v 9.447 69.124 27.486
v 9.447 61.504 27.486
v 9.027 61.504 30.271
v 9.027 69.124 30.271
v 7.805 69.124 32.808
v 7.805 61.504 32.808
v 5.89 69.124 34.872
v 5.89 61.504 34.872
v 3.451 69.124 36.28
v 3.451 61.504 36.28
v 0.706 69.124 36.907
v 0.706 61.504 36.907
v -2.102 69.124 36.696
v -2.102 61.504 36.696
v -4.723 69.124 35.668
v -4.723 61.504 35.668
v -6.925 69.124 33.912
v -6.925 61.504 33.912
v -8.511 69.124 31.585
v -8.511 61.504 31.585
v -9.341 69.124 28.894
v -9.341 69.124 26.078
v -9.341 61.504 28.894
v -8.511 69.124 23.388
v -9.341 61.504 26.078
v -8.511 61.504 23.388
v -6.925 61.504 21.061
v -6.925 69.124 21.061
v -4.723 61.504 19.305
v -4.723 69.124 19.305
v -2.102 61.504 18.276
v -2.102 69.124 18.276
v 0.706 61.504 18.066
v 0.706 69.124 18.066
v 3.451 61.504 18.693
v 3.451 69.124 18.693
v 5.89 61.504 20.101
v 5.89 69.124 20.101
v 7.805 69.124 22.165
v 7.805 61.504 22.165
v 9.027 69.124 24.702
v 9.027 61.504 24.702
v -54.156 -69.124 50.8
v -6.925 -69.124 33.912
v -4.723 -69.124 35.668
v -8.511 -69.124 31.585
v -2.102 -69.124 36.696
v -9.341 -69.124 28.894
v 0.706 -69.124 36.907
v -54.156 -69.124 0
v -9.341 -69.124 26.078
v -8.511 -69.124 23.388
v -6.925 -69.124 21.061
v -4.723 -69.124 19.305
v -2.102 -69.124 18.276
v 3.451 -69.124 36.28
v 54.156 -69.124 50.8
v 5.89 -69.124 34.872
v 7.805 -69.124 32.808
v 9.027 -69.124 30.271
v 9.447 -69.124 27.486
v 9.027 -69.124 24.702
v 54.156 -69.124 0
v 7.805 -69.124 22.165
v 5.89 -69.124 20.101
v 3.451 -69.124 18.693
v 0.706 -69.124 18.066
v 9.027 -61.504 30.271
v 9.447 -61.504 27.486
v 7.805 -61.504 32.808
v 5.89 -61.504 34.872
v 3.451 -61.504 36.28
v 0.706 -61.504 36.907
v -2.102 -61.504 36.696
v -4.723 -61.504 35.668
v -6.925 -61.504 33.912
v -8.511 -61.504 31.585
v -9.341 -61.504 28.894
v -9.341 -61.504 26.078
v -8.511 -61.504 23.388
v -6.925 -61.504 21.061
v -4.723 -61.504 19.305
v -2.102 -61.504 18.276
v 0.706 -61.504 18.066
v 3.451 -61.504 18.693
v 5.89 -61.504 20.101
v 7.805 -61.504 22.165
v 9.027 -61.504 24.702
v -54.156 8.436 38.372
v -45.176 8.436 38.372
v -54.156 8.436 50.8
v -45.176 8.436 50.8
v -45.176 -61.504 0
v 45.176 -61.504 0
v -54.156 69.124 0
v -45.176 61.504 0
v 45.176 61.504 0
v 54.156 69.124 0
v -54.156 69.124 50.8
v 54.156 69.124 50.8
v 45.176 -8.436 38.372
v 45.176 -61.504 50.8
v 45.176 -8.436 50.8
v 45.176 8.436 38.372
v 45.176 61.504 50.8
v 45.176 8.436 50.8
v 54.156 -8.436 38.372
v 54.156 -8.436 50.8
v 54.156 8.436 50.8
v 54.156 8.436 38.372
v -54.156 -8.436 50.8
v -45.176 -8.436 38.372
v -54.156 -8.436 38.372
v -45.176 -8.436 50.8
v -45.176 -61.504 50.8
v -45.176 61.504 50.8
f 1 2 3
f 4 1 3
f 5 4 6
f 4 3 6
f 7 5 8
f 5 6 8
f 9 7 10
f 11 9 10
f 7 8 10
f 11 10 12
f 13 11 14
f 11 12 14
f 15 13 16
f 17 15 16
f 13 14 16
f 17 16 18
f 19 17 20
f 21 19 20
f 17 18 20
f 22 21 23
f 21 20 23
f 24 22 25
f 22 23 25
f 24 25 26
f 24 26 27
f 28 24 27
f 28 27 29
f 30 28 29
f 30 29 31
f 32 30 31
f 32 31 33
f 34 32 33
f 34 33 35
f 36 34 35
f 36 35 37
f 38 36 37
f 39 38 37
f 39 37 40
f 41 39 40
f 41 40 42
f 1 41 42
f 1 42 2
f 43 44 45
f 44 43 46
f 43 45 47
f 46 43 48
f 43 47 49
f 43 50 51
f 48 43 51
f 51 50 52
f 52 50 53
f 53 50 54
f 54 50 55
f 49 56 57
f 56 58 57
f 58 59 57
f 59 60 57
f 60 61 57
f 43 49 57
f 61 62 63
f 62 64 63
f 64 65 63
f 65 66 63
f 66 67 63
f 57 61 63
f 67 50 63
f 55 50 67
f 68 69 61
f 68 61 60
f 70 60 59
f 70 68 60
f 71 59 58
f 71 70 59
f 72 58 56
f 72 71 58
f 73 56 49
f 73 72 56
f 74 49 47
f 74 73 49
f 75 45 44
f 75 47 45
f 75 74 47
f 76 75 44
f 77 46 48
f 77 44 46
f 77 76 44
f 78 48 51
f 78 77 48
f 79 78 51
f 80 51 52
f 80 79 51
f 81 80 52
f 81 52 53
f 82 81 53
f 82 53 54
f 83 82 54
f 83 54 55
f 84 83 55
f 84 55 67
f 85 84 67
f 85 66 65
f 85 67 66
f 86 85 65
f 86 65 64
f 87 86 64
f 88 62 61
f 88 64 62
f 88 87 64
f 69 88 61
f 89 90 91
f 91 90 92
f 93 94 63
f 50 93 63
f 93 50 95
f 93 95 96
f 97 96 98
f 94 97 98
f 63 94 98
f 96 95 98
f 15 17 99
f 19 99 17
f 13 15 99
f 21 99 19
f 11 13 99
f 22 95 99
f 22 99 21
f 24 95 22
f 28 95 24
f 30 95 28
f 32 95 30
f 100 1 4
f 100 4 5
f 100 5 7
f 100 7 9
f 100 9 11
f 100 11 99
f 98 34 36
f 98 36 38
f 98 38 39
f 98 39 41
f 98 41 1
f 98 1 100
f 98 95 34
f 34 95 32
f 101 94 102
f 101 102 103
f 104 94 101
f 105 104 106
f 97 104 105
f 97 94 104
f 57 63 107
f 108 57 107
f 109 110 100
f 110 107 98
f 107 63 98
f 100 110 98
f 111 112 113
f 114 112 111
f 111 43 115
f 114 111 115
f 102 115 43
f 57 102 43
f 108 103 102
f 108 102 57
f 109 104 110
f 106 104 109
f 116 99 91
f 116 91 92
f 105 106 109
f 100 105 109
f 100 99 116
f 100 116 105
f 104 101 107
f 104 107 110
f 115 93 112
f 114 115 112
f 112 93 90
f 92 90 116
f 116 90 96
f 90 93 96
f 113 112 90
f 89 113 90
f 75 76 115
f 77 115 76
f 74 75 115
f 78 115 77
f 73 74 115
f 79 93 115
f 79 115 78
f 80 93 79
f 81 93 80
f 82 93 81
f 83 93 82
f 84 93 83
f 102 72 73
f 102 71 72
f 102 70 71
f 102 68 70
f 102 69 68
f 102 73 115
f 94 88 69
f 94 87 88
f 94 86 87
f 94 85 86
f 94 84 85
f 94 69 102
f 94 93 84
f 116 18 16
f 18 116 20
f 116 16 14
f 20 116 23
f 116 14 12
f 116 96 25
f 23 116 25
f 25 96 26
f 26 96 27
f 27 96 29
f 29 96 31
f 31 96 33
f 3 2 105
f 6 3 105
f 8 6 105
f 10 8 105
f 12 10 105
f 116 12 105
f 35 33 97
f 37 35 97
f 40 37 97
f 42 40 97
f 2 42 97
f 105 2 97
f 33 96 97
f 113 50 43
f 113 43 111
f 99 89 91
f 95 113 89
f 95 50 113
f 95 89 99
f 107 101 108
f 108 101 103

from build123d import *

# Parameters (mm, degrees)
F0_W     = 108.312868
F0_H     = 138.248578
F1_DEPTH = 50.8
F2_W     = 90.351426
F2_H     = 123.008572
F3_DEPTH = 110.998
F4_W     = 16.872856
F4_H     = 12.51857
F5_DEPTH = 66.802
F6_DEPTH = 162.56
F7_R     = 9.446924
F8_DEPTH = 123.952
F9_DEPTH = 117.602


with BuildPart() as f1:
    # F0 (on Top) → F1 (new body)
    with BuildSketch(Plane.XY):
        Rectangle(F0_W, F0_H)
    extrude(amount=F1_DEPTH)

    # F2 (on Top) → F3 (cut)
    with BuildSketch(Plane.XY):
        Rectangle(F2_W, F2_H)
    extrude(amount=F3_DEPTH, mode=Mode.SUBTRACT)

    # F4 (on Right) → F5 (cut)
    with BuildSketch(Plane.YZ):
        with Locations((0, 44.631429)):
            Rectangle(F4_W, F4_H)
    extrude(amount=-F5_DEPTH, mode=Mode.SUBTRACT)

    # F4 (on Right) → F6 (cut)
    with BuildSketch(Plane.YZ):
        with Locations((0, 44.631429)):
            Rectangle(F4_W, F4_H)
    extrude(amount=F6_DEPTH, mode=Mode.SUBTRACT)

    # F7 (on Front) → F8 (cut)
    with BuildSketch(Plane.XZ):
        with Locations((0, 27.486429)):
            Circle(F7_R)
    extrude(amount=F8_DEPTH, mode=Mode.SUBTRACT)

    # F7 (on Front) → F9 (cut)
    with BuildSketch(Plane.XZ):
        with Locations((0, 27.486429)):
            Circle(F7_R)
    extrude(amount=-F9_DEPTH, mode=Mode.SUBTRACT)


solid = f1.part
